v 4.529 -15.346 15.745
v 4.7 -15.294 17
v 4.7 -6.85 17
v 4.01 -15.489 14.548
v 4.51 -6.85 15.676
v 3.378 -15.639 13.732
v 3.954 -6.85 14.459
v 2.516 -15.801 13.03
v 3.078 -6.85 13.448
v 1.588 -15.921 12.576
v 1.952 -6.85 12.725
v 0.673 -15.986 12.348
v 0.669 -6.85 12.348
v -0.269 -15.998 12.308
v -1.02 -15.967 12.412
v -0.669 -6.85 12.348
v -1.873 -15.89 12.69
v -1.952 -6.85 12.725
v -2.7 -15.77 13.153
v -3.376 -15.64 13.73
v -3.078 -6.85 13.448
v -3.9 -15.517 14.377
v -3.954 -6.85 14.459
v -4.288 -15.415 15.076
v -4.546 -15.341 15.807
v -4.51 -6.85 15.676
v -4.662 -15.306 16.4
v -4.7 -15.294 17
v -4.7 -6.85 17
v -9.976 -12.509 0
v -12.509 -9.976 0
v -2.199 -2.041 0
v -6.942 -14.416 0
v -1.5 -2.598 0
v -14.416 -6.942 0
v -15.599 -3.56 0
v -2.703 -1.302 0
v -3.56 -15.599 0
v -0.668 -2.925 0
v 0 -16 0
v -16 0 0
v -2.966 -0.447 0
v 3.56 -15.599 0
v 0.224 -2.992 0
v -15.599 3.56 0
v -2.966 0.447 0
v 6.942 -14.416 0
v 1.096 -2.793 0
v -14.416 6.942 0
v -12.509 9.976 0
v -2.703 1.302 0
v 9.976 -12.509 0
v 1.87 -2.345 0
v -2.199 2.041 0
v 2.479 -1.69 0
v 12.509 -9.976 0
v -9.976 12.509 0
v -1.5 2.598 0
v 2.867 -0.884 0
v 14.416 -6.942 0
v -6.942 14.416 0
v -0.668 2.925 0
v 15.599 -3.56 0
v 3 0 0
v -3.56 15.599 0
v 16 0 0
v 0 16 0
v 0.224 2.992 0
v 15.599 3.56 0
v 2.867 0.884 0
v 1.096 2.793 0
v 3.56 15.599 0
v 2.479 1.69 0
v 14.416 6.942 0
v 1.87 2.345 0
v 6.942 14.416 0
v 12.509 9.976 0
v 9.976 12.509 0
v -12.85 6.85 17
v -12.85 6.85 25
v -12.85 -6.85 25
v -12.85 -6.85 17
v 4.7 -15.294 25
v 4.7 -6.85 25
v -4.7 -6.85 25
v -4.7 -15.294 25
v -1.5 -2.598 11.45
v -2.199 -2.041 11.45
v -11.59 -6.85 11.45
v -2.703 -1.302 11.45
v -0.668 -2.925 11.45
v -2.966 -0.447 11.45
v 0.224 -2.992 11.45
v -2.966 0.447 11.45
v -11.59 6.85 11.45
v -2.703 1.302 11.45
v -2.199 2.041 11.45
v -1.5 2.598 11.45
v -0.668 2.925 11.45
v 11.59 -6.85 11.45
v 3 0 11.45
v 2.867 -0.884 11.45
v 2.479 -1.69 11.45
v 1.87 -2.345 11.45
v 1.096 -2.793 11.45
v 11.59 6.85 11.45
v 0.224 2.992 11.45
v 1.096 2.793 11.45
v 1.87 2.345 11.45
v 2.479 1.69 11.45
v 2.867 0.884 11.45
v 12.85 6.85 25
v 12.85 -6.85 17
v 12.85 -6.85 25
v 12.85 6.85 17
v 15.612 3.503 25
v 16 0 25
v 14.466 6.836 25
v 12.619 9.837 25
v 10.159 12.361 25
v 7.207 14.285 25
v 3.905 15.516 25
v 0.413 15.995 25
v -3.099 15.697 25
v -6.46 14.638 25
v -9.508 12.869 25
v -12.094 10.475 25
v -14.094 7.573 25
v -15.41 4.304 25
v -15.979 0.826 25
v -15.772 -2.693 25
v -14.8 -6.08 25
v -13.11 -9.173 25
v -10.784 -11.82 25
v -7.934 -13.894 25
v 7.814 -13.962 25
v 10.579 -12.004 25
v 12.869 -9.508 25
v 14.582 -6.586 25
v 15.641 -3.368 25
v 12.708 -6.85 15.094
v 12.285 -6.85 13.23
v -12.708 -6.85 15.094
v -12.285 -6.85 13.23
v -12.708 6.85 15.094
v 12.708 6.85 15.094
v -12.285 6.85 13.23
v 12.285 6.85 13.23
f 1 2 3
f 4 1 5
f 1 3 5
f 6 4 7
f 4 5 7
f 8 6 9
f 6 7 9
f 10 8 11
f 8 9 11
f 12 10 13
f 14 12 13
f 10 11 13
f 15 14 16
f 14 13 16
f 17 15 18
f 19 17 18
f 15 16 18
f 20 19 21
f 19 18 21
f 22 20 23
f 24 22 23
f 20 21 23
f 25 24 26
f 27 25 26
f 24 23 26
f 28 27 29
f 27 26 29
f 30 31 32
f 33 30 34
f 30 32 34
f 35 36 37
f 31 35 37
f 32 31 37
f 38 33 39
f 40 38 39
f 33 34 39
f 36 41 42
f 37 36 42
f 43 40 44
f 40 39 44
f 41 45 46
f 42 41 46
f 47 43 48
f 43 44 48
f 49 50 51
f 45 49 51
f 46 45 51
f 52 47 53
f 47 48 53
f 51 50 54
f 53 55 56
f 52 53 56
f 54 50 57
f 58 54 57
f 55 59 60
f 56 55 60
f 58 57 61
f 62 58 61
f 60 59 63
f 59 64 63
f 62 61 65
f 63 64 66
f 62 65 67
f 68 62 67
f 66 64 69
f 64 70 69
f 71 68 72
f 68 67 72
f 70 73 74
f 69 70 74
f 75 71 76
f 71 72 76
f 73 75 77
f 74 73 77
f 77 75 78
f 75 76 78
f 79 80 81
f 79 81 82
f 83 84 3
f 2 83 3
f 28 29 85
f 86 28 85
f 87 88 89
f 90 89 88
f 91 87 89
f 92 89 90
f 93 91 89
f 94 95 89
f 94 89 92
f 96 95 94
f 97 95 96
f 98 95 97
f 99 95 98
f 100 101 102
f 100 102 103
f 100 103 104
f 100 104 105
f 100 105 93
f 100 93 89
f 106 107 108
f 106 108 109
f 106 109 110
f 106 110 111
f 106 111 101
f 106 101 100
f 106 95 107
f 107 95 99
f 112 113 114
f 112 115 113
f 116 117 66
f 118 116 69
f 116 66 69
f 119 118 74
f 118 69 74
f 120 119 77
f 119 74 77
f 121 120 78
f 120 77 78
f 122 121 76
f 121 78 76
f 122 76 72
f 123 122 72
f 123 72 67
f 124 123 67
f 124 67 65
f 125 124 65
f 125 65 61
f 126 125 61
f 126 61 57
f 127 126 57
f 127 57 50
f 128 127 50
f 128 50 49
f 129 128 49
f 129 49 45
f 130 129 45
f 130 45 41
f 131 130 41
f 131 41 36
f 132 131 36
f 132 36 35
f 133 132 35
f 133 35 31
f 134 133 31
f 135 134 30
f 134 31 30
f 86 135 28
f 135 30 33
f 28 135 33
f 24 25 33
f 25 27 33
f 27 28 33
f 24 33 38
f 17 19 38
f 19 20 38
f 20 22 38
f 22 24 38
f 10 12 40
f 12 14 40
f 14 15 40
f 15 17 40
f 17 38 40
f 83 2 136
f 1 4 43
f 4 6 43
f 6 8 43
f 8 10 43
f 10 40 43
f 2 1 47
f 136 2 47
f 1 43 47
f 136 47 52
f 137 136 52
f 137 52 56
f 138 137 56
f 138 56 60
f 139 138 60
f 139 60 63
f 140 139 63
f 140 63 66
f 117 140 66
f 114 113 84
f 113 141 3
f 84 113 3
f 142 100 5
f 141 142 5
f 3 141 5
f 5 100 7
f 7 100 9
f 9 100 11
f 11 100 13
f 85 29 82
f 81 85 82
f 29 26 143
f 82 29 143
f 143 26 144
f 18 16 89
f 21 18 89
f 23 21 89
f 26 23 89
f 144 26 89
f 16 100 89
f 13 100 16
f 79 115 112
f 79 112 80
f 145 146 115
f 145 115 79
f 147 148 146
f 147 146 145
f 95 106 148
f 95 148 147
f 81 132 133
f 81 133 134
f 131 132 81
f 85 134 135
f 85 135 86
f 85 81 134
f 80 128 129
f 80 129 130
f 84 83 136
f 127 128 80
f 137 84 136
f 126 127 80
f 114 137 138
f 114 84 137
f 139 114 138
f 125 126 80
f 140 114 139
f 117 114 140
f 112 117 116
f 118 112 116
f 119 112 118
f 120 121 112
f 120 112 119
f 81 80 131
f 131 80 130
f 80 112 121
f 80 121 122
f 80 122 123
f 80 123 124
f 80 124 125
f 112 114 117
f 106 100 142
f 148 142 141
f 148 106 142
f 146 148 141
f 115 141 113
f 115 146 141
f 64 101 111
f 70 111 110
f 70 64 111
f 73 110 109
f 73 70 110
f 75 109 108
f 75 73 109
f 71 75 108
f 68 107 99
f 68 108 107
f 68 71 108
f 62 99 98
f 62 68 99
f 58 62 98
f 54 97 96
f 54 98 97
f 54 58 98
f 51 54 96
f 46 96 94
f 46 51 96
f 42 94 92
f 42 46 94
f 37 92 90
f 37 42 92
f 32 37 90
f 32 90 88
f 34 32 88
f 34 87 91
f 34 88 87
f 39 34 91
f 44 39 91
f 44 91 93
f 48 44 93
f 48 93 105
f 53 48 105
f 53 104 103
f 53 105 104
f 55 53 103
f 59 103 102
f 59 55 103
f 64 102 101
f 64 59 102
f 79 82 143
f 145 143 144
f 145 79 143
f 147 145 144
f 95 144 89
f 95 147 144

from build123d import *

# Parameters (mm, degrees)
SKETCH1_R               = 16
SKETCH1_R_2             = 3
BOSS_EXTRUDE1_DEPTH     = 25
CUT_EXTRUDE1_DEPTH      = 6.85
CUT_EXTRUDE2_REACH      = 35.719
CUT_EXTRUDE2_END_RADIUS = 16


with BuildPart() as part:
    # Sketch1 → Boss-Extrude1 (new body)
    with BuildSketch(Plane.XY):
        Circle(SKETCH1_R)
        Circle(SKETCH1_R_2, mode=Mode.SUBTRACT)
    extrude(amount=BOSS_EXTRUDE1_DEPTH)

    # Sketch2 → Cut-Extrude1 (cut, symmetric)
    with BuildSketch(Plane(origin=(0, 0, 0), x_dir=(1, 0, 0), z_dir=(0, 1, 0))):
        with BuildLine():
            Line((-11.589650556, -11.45), (11.589650556, -11.45))
            ThreePointArc((11.589650556, -11.45), (12.530951872, -14.154346265), (12.85, -17))
            Line((12.85, -17), (12.85, -25))
            Line((12.85, -25), (-12.85, -25))
            Line((-12.85, -25), (-12.85, -17))
            ThreePointArc((-12.85, -17), (-12.530951872, -14.154346265), (-11.589650556, -11.45))
        make_face()
    extrude(amount=CUT_EXTRUDE1_DEPTH, both=True, mode=Mode.SUBTRACT)

    # Cut-Extrude2: up to this cylinder (the profile starts inside it)
    cut_extrude2_end = Plane(origin=(0, 0, 19.107252), z_dir=(0, 0, -1)) * Cylinder(CUT_EXTRUDE2_END_RADIUS, 104.438, mode=Mode.PRIVATE)
    # Sketch3 → Cut-Extrude2 (cut, up to the surface)
    with BuildSketch(Plane(origin=(0, 0, 0), x_dir=(1, 0, 0), z_dir=(0, 1, 0)), mode=Mode.PRIVATE) as cut_extrude2_sk1:
        with BuildLine():
            Line((-4.7, -17), (-4.7, -25))
            Line((-4.7, -25), (4.7, -25))
            Line((4.7, -25), (4.7, -17))
            ThreePointArc((4.7, -17), (0, -12.3), (-4.7, -17))
        make_face()
    cut_extrude2_tool1 = extrude(cut_extrude2_sk1.sketch, amount=-CUT_EXTRUDE2_REACH, mode=Mode.PRIVATE) & cut_extrude2_end
    add(cut_extrude2_tool1.solids().sort_by_distance((0, 0, 19.107252))[0], mode=Mode.SUBTRACT)


solid = part.part
